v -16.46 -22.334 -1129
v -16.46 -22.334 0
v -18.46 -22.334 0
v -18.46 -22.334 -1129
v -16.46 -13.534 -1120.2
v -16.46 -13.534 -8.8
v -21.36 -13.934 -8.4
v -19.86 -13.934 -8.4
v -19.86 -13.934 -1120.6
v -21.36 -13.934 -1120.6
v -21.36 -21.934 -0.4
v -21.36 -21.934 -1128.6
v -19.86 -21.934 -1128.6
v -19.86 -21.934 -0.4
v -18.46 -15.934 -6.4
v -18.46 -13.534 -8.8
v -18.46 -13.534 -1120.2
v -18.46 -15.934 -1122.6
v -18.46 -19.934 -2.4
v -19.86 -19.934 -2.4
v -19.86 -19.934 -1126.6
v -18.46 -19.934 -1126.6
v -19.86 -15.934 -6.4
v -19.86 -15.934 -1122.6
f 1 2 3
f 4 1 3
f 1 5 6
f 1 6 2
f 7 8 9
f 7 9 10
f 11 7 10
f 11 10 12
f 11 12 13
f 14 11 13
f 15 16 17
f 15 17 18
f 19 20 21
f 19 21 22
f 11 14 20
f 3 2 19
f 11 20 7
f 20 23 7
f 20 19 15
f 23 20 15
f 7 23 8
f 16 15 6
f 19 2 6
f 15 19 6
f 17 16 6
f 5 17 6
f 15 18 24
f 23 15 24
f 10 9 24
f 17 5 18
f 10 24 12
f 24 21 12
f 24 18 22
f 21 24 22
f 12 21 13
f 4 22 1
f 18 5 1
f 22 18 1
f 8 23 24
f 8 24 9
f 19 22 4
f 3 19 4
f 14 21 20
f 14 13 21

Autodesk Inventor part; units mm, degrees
ref_plane "YZ Plane" through (0, 0, 0) normal (1, 0, 0) x (0, 1, 0)
ref_plane "XZ Plane" through (0, 0, 0) normal (0, 1, 0) x (-1, 0, 0)
ref_plane "XY Plane" through (0, 0, 0) normal (0, 0, 1) x (1, 0, 0)
sketch "Boceto1" plane through (0, 0, 0) normal (0, 0, 1) x (1, 0, 0)
  line L0 (-18.4596, -13.534) -> (-18.4596, -15.934)
  line L1 (-18.4596, -15.934) -> (-19.8596, -15.934)
  line L2 (-19.8596, -15.934) -> (-19.8596, -13.934)
  line L3 (-19.8596, -13.934) -> (-21.3596, -13.934)
  line L4 (-21.3596, -13.934) -> (-21.3596, -21.934)
  line L5 (-21.3596, -21.934) -> (-19.8596, -21.934)
  line L6 (-19.8596, -21.934) -> (-19.8596, -19.934)
  line L7 (-19.8596, -19.934) -> (-18.4596, -19.934)
  line L8 (-18.4596, -19.934) -> (-18.4596, -22.334)
  line L9 (-18.4596, -13.534) -> (-16.4596, -13.534)
  line L10 (-16.4596, -13.534) -> (-16.4596, -22.334)
  line L11 (-16.4596, -22.334) -> (-18.4596, -22.334)
  point P0 (-26.2596, -17.734)
  point P1 (-21.3596, -17.934)
  dimension "d28" = 1.4
  dimension "d30" = 1.4
  dimension "d34" = 8
  dimension "d35" = 2
  dimension "d36" = 4
  dimension "d37" = 1.5
  dimension "d64" = 8.8
  dimension "d65" = 2
extrude "Extrusión1" add sketch "Boceto1" against normal blind 1129
ref_plane "Plano de trabajo2" through (0, 0, -564.5) normal (0, 0, -1) x (-1, 0, 0)
sketch "Boceto3" plane through (-16.4596, -22.334, 0) normal (1, 0, 0) x (0, 0, -1)
  line L0 (0, 0) -> (0, 8.8) projected
  line L1 (0, 0) -> (1129, 0) projected
  line L2 (1129, 8.8) -> (1129, 0) projected
  line L3 (0, 8.8) -> (1129, 8.8) projected
  line L4 (0, 0) -> (8.8, 8.8)
  line L5 (8.8, 8.8) -> (0, 8.8)
  line L6 (0, 0) -> (0, 8.8)
  point P0 (0, 22.334)
  dimension "d69" = 45
extrude "Extrusión2" cut sketch "Boceto3" against normal blind 692.2 contours L0 L3 L4
mirror "Simetría2" about plane through (0, 0, -564.5) normal (0, 0, -1) of "Extrusión2"
properties part number "JUNTA DE FELPA 1128 mm" material "Caucho"
